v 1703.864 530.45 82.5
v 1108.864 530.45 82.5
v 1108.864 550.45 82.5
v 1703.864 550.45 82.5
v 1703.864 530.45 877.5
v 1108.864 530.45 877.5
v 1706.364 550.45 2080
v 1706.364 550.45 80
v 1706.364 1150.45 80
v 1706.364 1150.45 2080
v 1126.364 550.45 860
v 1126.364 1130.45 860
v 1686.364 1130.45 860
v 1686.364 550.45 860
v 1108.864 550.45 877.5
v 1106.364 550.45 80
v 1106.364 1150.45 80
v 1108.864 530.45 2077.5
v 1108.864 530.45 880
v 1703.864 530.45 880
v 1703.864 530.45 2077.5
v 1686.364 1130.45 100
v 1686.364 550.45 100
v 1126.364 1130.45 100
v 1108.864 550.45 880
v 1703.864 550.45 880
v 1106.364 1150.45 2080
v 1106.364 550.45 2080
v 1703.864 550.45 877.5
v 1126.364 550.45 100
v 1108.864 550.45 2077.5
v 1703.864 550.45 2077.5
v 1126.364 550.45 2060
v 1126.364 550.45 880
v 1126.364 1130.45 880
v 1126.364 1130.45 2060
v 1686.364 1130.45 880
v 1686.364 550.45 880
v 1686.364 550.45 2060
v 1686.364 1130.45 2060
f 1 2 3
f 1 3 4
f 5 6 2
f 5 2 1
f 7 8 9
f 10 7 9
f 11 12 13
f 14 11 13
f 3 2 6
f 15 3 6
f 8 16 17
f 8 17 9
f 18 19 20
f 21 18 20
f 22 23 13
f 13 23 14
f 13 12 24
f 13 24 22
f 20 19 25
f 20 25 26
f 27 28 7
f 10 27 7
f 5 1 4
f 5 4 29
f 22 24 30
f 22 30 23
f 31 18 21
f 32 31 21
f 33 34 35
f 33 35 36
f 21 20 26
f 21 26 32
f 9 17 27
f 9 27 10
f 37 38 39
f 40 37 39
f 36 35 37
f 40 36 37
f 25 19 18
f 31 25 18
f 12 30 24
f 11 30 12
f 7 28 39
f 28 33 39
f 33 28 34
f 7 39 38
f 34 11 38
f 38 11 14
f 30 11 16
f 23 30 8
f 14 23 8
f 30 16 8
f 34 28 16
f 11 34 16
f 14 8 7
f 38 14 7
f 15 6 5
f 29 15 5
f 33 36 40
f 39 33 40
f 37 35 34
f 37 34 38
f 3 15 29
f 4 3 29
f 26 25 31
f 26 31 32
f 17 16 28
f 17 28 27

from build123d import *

# Parameters (mm, degrees)
F3_W      = 600
F3_H      = 600
F4_DEPTH  = 2000
F5_W      = 560
F5_H      = 1180
F5_H_2    = 760
F6_DEPTH  = 580
F9_W      = 600
F9_H      = 2000
F10_DEPTH = 20
F11_W     = 595
F11_H     = 795
F11_H_2   = 1197.5
F12_DEPTH = 20
F13_DEPTH = 20


with BuildPart() as f4:
    # F3 (on offset) → F4 (new body)
    with BuildSketch(Plane.XY.offset(80)):
        with Locations((1406.3643673062, 850.4504614572)):
            Rectangle(F3_W, F3_H)
    extrude(amount=F4_DEPTH)

    # F5 (on face) → F6 (cut)
    with BuildSketch(Plane.XZ.offset(-550.4504614572)):
        with Locations((1406.3643673062, 1470)):
            Rectangle(F5_W, F5_H)
        with Locations((1406.3643673062, 480)):
            Rectangle(F5_W, F5_H_2)
    extrude(amount=-F6_DEPTH, mode=Mode.SUBTRACT)

    # F11 (on face) → F13 (cut)
    with BuildSketch(Plane.XZ.offset(-530.4504614572)):
        Polygon((1706.3643673062, 880), (1706.3643673062, 2080), (1106.3643673062, 2080), (1106.3643673062, 880), (1106.3643673062, 80), (1706.3643673062, 80), align=None)
        with Locations((1406.3643673062, 480)):
            Rectangle(F11_W, F11_H, mode=Mode.SUBTRACT)
        with Locations((1406.3643673062, 1478.75)):
            Rectangle(F11_W, F11_H_2, mode=Mode.SUBTRACT)
    extrude(amount=-F13_DEPTH, mode=Mode.SUBTRACT)


with BuildPart() as f10:
    # F9 (on offset) → F10 (new body)
    with BuildSketch(Plane.XZ.offset(-550.4504614572)):
        with Locations((1406.3643673062, 1080)):
            Rectangle(F9_W, F9_H)
    extrude(amount=F10_DEPTH)

    # F11 (on face) → F12 (cut)
    with BuildSketch(Plane.XZ.offset(-530.4504614572)):
        Polygon((1706.3643673062, 880), (1706.3643673062, 2080), (1106.3643673062, 2080), (1106.3643673062, 880), (1106.3643673062, 80), (1706.3643673062, 80), align=None)
        with Locations((1406.3643673062, 480)):
            Rectangle(F11_W, F11_H, mode=Mode.SUBTRACT)
        with Locations((1406.3643673062, 1478.75)):
            Rectangle(F11_W, F11_H_2, mode=Mode.SUBTRACT)
    extrude(amount=-F12_DEPTH, mode=Mode.SUBTRACT)


solid = Compound([f4.part, f10.part])
